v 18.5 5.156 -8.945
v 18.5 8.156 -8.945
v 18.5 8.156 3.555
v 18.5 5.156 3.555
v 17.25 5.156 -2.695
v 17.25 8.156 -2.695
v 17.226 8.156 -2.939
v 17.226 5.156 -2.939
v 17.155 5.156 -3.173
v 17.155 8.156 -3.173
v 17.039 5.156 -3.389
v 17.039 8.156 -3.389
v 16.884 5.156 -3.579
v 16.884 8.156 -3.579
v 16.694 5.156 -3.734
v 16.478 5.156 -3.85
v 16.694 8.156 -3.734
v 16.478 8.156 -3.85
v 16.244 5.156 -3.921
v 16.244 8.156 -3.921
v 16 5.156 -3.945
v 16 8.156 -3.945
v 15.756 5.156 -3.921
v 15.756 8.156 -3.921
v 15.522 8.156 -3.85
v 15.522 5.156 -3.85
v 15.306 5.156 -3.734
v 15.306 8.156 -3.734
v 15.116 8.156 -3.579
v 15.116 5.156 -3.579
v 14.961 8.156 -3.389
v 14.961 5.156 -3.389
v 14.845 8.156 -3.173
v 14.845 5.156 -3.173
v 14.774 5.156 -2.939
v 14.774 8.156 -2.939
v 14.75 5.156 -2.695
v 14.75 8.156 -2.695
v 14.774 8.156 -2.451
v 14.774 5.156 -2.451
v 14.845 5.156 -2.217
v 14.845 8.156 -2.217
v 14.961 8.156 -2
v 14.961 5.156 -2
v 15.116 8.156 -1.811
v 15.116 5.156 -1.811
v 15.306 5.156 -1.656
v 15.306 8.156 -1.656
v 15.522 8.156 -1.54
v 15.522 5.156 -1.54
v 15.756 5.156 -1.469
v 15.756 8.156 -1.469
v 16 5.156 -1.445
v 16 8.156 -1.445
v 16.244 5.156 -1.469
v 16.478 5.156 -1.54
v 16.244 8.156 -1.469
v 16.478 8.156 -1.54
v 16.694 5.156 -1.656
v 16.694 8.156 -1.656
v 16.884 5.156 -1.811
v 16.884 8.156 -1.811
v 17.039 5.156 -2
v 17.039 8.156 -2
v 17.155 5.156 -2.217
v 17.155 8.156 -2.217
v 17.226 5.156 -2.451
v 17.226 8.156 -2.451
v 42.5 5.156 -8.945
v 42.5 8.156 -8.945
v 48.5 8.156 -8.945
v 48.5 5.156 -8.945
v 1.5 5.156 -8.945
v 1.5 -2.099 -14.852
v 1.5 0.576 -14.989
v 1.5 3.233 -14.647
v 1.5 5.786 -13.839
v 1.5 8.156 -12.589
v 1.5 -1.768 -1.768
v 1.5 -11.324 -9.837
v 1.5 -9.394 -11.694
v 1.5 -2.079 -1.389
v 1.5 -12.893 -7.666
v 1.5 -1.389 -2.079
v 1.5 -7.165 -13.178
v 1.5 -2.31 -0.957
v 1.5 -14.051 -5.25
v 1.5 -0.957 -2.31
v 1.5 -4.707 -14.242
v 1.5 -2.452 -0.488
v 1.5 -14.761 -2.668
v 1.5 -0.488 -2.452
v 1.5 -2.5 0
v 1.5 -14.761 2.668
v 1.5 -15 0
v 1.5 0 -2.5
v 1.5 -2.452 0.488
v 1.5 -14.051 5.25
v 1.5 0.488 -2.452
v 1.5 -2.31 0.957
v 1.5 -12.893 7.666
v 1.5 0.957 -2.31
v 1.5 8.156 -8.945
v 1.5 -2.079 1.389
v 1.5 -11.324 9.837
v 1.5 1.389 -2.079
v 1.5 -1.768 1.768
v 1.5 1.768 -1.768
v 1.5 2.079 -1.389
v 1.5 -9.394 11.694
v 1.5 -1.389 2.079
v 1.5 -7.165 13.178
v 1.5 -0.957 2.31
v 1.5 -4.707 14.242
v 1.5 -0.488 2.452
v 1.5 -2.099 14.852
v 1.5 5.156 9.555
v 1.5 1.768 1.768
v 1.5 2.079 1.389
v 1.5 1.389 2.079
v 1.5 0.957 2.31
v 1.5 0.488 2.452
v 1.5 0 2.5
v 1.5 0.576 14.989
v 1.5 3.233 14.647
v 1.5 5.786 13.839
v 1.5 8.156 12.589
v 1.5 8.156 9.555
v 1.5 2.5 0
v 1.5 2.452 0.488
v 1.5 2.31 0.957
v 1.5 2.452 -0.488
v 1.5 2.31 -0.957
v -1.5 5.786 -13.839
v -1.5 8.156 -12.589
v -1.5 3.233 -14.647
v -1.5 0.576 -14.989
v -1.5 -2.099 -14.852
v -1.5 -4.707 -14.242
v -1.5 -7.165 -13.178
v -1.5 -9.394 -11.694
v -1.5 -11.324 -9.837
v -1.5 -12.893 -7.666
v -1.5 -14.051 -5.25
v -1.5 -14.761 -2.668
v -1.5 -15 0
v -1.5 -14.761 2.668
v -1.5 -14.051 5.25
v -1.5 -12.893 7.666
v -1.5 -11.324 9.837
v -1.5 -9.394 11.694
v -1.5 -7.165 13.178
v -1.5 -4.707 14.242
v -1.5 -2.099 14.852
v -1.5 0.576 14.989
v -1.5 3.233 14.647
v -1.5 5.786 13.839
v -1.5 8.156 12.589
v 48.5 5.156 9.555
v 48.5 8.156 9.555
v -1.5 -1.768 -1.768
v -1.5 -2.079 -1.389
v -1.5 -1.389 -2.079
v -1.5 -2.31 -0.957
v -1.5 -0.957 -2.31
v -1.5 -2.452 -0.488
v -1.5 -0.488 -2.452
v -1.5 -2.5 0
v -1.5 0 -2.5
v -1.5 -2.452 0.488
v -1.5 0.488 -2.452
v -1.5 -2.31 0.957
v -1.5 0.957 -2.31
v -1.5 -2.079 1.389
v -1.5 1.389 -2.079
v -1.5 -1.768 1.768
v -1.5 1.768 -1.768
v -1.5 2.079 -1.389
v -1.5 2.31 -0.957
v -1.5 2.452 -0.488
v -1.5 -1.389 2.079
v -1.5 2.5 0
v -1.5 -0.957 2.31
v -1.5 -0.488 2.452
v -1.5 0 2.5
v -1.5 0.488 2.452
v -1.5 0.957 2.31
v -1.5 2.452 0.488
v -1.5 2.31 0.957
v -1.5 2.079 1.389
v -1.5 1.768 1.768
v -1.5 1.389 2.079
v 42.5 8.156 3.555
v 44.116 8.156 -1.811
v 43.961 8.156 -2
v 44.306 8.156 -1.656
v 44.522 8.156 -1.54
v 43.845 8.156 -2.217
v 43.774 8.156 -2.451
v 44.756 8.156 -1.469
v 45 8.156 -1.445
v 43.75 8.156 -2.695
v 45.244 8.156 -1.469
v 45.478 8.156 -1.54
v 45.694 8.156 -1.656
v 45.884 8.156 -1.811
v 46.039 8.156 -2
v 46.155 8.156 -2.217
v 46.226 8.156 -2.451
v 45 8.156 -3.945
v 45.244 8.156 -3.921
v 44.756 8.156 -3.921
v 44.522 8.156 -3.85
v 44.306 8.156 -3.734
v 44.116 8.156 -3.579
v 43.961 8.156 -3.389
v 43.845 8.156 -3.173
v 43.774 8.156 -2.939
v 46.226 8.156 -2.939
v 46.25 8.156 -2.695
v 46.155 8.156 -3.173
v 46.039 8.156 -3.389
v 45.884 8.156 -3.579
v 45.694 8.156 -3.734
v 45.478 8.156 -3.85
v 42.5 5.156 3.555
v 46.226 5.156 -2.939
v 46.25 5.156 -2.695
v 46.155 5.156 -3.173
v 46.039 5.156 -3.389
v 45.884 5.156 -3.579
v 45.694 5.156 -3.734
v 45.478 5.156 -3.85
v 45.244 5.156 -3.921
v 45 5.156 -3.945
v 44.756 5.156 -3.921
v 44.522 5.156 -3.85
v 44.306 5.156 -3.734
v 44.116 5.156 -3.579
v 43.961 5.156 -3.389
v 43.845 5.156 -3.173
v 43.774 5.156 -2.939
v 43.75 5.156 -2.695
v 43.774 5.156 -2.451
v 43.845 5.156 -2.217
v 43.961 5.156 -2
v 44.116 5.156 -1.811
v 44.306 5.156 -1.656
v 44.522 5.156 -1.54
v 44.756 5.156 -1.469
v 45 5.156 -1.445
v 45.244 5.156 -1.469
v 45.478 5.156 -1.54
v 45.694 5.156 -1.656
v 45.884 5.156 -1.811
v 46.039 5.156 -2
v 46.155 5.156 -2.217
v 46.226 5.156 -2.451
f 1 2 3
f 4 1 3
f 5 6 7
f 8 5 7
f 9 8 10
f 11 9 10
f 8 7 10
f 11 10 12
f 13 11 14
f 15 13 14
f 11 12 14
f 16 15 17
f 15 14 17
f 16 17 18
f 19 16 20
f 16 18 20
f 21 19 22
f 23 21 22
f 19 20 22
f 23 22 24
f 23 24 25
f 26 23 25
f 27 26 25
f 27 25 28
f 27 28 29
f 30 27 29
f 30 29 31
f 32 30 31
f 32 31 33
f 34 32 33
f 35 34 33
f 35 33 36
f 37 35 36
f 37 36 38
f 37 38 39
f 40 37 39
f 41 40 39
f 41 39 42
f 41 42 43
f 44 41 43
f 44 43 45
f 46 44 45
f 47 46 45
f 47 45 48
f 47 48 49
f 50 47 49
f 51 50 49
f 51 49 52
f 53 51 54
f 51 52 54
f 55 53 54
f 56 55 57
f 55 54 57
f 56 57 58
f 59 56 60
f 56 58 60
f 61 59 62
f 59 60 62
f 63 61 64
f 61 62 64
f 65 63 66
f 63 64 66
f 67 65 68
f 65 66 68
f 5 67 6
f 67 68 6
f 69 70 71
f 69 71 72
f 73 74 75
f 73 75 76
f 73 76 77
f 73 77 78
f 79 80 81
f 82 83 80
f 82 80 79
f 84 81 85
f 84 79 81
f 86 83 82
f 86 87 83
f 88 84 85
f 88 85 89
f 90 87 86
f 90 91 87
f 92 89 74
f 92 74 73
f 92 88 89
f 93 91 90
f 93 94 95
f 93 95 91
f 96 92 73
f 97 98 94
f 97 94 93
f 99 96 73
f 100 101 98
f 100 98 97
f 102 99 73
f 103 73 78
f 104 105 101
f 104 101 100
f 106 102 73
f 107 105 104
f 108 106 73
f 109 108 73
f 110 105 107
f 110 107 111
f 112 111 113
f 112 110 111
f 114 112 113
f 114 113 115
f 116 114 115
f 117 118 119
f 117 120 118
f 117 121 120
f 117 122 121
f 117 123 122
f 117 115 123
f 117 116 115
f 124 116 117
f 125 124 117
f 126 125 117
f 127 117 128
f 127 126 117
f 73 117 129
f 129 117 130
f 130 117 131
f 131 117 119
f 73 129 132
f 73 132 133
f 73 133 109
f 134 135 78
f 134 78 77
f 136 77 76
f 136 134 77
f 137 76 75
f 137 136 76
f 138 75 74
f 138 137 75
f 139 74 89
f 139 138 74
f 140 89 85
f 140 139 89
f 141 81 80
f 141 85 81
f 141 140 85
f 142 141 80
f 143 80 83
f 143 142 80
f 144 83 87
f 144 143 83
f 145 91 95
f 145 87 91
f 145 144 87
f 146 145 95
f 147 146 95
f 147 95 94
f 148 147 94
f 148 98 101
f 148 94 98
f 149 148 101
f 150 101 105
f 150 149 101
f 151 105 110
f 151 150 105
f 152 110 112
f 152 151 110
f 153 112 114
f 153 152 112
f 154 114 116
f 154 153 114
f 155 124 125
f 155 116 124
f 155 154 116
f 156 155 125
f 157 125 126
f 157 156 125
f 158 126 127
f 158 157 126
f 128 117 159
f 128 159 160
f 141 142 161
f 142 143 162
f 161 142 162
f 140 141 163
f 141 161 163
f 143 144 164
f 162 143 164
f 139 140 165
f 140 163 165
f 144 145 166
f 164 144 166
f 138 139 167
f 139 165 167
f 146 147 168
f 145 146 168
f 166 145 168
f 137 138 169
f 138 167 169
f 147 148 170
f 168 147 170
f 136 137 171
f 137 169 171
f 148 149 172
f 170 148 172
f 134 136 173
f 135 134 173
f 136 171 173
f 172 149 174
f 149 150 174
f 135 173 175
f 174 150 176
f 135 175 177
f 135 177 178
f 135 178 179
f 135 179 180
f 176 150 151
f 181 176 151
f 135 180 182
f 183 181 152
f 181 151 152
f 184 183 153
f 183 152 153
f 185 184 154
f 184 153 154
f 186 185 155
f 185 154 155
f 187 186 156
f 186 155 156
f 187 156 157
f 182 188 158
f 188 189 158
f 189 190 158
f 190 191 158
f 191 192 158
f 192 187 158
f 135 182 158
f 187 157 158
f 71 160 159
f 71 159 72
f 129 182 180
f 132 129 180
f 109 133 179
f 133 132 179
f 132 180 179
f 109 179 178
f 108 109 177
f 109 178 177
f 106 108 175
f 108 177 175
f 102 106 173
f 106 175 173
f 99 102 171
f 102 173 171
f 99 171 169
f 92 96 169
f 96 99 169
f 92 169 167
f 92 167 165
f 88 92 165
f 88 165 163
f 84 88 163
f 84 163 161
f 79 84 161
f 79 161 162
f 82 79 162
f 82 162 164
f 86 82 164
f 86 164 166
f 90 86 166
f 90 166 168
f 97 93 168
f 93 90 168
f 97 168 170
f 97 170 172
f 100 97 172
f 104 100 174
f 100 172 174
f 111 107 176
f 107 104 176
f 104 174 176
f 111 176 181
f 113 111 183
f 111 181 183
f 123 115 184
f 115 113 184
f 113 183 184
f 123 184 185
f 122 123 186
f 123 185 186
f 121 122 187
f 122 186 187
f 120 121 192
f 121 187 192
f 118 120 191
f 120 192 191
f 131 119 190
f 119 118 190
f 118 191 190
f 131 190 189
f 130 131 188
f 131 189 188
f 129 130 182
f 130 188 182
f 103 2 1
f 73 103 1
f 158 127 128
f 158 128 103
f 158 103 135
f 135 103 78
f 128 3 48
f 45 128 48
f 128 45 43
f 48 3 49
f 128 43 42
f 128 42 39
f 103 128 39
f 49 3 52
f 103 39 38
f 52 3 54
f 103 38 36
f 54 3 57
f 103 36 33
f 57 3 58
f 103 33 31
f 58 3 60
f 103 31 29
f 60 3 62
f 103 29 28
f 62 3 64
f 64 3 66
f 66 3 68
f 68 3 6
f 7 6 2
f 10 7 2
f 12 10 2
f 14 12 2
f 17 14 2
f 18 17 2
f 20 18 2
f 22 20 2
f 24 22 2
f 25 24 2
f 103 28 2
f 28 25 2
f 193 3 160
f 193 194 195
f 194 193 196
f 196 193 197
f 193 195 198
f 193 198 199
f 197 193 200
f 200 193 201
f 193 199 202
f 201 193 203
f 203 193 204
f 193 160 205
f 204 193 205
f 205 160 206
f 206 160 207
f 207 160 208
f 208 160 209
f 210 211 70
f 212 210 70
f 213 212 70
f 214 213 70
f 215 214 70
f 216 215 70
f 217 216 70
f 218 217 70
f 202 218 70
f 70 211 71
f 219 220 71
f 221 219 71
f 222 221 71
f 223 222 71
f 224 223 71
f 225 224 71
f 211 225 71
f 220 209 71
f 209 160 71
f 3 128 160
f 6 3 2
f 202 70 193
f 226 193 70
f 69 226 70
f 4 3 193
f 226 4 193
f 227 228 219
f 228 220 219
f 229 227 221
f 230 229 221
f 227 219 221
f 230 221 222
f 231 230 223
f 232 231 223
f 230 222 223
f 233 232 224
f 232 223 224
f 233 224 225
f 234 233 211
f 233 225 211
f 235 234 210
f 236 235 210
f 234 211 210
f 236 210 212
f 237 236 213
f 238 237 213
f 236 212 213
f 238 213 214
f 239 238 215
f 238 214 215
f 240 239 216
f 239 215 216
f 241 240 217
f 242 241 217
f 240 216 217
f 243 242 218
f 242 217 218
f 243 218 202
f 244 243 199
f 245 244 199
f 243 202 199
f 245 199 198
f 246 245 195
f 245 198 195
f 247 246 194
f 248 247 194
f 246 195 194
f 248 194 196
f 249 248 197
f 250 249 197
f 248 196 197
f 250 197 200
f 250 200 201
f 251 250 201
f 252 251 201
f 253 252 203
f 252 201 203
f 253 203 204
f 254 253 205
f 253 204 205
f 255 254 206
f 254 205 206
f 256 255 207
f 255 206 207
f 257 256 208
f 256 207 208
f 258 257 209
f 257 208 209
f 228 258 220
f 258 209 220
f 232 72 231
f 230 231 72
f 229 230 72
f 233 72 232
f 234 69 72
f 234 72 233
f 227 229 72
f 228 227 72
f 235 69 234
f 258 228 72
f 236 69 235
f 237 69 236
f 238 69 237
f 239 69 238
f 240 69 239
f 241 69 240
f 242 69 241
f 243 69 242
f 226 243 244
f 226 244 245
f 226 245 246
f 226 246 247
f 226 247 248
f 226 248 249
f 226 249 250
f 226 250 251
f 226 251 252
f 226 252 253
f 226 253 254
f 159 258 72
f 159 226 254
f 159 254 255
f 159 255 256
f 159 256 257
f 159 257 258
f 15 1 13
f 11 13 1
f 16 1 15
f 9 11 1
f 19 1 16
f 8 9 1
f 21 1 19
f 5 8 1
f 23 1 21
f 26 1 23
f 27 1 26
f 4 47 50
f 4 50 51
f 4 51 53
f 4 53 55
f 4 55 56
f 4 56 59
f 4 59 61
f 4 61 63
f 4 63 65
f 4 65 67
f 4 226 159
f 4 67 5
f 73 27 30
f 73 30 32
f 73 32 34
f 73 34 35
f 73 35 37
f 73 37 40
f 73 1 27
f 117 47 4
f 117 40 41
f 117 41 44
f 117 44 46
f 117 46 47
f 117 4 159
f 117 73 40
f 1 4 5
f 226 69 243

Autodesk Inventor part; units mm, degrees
ref_plane "YZ Plane" through (0, 0, 0) normal (1, 0, 0) x (0, 1, 0)
ref_plane "XZ Plane" through (0, 0, 0) normal (0, 1, 0) x (-1, 0, 0)
ref_plane "XY Plane" through (0, 0, 0) normal (0, 0, 1) x (1, 0, 0)
sketch "草圖1" plane through (0, 0, 0) normal (1, 0, 0) x (0, 1, 0)
  circle A0 centre (0, 0) radius 2.5
  circle A1 centre (0, 0) radius 15
  dimension "d0" = 5
  dimension "d1" = 30
extrude "擠出1" add sketch "草圖1" along normal mid plane 3
sketch "草圖2" plane through (1.5, 0, 0) normal (1, 0, 0) x (0, 0, -1)
  line L0 (-9.5551, 8.1555) -> (8.9449, 8.1555)
  line L1 (8.9449, 8.1555) -> (8.9449, 5.1555)
  line L2 (8.9449, 5.1555) -> (-9.5551, 5.1555)
  line L3 (-9.5551, 5.1555) -> (-9.5551, 8.1555)
  point P0 (0, 0)
  dimension "d4" = 18.5
  dimension "d5" = 3
extrude "擠出2" add sketch "草圖2" along normal blind 47
sketch "草圖3" plane through (1.5, 8.1555, 9.5551) normal (0, 1, 0) x (1, 0, 0)
  line L0 (0, 18.5) -> (47, 18.5) construction
  line L1 (41, 18.5) -> (17, 18.5)
  line L2 (17, 18.5) -> (17, 6)
  line L3 (17, 6) -> (41, 6)
  line L4 (41, 6) -> (41, 18.5)
  line L5 (47, 18.5) -> (47, 0) construction
  line L6 (47, 0) -> (47, 18.5) projected
  line L7 (47, 12.25) -> (14.3759, 12.25) construction
  circle A0 centre (43.5, 12.25) radius 1.25
  line L8 (29, 12.25) -> (29, 6) construction
  circle A1 centre (14.5, 12.25) radius 1.25
  point P0 (-1.5, 9.5551)
  point P1 (41, 12.25)
  dimension "d8" = 24
  dimension "d9" = 12.5
  dimension "d10" = 6
  dimension "d11" = 2.5
  dimension "d12" = 29
extrude "擠出3" cut sketch "草圖3" against normal up to surface (3 mm away)
sketch "草圖4" plane through (1.5, 0, 0) normal (1, 0, 0) x (0, 0, -1)
  line L0 (-9.5551, 8.1555) -> (8.9449, 8.1555) projected
  line L1 (-12.5892, 8.1555) -> (12.5892, 8.1555)
  circle A0 centre (0, 0) radius 15 projected
extrude "擠出4" cut sketch "草圖4" against normal up to surface (3 mm away) contours L1 A0 L0 picked at (-0.2034, 10.437)
properties part number "Arm_2"
